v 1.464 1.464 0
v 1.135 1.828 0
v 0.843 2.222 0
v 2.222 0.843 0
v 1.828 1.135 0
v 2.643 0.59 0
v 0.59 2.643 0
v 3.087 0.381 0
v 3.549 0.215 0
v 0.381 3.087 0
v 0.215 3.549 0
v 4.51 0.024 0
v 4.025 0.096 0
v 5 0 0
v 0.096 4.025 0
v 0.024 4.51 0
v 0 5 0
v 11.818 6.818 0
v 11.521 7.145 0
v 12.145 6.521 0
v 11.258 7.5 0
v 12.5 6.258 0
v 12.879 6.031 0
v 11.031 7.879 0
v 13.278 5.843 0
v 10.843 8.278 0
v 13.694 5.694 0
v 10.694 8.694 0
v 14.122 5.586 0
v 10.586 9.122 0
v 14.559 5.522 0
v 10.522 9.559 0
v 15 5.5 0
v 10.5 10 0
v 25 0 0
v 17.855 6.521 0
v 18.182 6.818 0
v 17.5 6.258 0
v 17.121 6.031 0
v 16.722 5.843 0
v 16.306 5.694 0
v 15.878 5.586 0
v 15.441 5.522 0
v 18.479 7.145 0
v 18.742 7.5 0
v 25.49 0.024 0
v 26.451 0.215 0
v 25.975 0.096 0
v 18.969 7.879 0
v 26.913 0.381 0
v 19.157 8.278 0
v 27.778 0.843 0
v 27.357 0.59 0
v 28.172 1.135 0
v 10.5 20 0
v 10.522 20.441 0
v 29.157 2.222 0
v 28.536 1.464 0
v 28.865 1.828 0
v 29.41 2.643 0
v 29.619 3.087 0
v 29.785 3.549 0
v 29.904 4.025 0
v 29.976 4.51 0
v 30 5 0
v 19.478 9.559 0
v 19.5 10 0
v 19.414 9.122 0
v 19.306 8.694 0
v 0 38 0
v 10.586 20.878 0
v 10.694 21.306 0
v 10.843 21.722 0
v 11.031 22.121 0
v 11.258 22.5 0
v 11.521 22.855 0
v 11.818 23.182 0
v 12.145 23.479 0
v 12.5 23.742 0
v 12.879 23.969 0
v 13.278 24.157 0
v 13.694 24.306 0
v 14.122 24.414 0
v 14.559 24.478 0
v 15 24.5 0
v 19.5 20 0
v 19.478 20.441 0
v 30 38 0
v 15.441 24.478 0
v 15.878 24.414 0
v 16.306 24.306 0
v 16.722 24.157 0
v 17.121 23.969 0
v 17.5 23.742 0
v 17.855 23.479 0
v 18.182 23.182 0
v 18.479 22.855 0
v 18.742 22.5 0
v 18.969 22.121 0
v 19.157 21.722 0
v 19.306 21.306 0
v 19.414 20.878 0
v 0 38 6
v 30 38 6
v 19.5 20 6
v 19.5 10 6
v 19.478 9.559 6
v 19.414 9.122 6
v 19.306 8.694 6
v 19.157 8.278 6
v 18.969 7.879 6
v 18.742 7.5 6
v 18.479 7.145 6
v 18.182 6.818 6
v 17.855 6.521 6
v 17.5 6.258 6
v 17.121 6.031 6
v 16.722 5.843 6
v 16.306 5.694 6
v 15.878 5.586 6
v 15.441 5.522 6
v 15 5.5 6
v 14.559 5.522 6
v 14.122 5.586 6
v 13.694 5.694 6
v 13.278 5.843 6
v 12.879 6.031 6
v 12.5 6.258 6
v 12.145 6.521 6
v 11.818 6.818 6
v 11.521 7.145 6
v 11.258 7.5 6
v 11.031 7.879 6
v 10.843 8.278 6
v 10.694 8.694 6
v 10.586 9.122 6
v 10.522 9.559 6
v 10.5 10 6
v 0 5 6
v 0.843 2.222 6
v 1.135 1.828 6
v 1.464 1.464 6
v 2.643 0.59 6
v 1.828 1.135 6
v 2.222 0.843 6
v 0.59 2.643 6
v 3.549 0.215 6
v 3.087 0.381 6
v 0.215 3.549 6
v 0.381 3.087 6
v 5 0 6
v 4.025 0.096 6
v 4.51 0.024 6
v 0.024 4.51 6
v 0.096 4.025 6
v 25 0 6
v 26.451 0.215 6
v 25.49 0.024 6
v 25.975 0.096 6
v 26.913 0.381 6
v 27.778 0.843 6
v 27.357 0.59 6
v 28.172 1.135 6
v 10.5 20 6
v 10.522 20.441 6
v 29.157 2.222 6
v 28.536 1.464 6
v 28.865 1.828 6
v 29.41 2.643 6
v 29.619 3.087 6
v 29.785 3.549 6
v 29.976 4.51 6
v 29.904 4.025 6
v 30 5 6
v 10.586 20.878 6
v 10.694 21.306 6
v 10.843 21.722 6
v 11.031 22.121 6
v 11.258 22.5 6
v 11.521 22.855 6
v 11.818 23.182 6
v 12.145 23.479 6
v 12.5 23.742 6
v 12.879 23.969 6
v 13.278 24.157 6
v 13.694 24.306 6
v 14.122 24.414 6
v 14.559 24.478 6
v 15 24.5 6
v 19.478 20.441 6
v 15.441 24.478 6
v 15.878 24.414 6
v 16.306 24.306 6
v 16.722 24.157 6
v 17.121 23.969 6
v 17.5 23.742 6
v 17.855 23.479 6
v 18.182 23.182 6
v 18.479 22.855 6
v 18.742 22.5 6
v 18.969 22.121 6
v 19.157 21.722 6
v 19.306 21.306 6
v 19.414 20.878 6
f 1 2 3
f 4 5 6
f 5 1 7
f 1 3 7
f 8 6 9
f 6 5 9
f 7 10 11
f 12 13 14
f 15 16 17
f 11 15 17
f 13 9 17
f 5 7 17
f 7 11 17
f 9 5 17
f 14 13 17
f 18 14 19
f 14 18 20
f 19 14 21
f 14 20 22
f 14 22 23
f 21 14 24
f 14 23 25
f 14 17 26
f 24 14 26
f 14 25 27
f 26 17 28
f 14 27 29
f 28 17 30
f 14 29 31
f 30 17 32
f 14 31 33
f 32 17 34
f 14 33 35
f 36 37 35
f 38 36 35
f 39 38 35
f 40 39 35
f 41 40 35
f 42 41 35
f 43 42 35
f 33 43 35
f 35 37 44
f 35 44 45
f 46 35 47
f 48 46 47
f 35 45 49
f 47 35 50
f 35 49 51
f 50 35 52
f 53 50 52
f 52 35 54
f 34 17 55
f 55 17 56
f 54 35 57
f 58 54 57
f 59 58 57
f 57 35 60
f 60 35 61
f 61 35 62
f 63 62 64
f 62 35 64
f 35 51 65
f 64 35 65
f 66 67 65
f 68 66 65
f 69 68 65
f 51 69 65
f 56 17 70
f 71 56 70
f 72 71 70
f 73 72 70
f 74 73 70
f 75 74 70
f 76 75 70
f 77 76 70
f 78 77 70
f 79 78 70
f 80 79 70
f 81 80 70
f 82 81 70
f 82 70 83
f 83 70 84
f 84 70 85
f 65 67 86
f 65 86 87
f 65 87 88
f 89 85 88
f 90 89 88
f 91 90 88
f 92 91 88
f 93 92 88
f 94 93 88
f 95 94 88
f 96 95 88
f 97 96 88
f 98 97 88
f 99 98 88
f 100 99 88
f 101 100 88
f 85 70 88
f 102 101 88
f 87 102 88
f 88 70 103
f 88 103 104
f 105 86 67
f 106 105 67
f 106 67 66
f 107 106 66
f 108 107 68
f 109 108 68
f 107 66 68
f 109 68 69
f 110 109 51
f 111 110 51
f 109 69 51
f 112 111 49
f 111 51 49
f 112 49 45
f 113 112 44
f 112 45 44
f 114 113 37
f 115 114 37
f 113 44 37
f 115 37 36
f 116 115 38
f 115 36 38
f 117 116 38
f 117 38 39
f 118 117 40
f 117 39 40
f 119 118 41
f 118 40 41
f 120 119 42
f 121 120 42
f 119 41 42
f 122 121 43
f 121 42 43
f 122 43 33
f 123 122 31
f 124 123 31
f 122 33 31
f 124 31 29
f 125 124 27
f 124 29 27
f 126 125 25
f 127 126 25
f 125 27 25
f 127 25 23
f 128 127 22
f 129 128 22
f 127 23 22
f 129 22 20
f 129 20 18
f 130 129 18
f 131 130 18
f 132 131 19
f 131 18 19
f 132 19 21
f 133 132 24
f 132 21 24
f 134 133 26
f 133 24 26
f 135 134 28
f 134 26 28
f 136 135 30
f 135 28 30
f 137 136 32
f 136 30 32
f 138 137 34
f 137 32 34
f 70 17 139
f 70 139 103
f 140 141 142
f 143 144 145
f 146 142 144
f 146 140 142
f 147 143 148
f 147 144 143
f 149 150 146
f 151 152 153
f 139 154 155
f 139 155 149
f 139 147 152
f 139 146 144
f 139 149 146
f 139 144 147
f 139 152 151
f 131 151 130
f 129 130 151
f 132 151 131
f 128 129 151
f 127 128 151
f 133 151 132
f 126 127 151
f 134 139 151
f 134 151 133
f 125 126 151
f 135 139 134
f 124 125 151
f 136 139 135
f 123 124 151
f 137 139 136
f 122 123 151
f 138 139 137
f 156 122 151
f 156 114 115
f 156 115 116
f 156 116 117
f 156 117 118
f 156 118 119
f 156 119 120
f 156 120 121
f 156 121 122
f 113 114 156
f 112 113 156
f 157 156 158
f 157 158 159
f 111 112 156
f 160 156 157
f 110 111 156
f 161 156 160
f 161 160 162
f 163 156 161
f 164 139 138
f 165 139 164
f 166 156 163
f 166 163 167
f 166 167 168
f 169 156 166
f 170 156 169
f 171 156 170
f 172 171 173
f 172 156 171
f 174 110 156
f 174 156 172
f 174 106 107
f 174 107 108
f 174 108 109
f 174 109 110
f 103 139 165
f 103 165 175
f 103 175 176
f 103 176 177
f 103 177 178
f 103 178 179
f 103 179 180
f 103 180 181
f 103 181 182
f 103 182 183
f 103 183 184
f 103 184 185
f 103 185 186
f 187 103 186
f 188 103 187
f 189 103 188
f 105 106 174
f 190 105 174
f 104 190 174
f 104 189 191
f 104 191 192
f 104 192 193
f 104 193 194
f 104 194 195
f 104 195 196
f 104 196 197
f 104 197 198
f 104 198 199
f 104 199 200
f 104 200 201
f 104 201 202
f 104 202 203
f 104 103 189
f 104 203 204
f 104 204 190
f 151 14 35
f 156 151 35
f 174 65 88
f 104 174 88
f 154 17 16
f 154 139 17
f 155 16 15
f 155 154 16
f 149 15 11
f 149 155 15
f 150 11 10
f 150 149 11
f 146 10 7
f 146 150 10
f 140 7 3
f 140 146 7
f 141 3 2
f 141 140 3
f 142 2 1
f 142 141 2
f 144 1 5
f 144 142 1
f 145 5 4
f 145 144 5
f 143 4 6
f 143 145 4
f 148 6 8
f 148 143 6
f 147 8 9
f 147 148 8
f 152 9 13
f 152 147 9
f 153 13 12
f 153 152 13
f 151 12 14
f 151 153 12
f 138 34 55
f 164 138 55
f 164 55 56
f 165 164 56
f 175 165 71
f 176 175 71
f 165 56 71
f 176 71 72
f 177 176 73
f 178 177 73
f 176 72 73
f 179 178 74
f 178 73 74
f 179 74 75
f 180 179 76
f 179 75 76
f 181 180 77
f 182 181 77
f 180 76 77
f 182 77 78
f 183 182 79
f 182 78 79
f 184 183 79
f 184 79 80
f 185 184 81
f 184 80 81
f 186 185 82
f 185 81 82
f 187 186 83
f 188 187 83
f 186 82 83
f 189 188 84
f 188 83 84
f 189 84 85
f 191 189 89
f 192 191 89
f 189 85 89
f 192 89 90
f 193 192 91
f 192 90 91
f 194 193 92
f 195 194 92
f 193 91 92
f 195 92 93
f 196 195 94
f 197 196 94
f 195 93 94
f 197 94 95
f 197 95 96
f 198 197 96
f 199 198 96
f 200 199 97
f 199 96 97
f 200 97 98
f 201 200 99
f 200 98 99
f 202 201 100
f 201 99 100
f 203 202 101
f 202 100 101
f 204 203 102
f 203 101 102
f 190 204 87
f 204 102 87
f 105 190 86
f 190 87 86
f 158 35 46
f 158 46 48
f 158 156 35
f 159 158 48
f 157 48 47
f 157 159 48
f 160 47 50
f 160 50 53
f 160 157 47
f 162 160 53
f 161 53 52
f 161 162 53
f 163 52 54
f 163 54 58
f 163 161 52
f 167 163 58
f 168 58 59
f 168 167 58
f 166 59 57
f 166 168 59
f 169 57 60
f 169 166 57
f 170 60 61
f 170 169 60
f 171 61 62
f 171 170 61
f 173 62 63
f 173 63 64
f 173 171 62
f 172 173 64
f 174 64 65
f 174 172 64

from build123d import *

# Parameters (mm, degrees)
SKETCH_1_W      = 30
SKETCH_1_H      = 38
EXTRUDE_1_DEPTH = 6
FILLET_1_R      = 5


with BuildPart() as part:
    # 草图1 → 凸台-拉伸1 (new body)
    with BuildSketch(Plane.XY):
        with Locations((15, 19)):
            Rectangle(SKETCH_1_W, SKETCH_1_H)
        with BuildLine():
            Line((19.5, 20), (19.5, 10))
            ThreePointArc((19.5, 10), (15, 5.5), (10.5, 10))
            Line((10.5, 10), (10.5, 20))
            ThreePointArc((10.5, 20), (15, 24.5), (19.5, 20))
        make_face(mode=Mode.SUBTRACT)
    extrude(amount=EXTRUDE_1_DEPTH)

    # 圆角1
    fillet_1_edges = [part.edges().sort_by_distance(p)[0] for p in [
        (30, 0, 3),
        (0, 0, 3),
    ]]
    fillet(fillet_1_edges, radius=FILLET_1_R)


solid = part.part
